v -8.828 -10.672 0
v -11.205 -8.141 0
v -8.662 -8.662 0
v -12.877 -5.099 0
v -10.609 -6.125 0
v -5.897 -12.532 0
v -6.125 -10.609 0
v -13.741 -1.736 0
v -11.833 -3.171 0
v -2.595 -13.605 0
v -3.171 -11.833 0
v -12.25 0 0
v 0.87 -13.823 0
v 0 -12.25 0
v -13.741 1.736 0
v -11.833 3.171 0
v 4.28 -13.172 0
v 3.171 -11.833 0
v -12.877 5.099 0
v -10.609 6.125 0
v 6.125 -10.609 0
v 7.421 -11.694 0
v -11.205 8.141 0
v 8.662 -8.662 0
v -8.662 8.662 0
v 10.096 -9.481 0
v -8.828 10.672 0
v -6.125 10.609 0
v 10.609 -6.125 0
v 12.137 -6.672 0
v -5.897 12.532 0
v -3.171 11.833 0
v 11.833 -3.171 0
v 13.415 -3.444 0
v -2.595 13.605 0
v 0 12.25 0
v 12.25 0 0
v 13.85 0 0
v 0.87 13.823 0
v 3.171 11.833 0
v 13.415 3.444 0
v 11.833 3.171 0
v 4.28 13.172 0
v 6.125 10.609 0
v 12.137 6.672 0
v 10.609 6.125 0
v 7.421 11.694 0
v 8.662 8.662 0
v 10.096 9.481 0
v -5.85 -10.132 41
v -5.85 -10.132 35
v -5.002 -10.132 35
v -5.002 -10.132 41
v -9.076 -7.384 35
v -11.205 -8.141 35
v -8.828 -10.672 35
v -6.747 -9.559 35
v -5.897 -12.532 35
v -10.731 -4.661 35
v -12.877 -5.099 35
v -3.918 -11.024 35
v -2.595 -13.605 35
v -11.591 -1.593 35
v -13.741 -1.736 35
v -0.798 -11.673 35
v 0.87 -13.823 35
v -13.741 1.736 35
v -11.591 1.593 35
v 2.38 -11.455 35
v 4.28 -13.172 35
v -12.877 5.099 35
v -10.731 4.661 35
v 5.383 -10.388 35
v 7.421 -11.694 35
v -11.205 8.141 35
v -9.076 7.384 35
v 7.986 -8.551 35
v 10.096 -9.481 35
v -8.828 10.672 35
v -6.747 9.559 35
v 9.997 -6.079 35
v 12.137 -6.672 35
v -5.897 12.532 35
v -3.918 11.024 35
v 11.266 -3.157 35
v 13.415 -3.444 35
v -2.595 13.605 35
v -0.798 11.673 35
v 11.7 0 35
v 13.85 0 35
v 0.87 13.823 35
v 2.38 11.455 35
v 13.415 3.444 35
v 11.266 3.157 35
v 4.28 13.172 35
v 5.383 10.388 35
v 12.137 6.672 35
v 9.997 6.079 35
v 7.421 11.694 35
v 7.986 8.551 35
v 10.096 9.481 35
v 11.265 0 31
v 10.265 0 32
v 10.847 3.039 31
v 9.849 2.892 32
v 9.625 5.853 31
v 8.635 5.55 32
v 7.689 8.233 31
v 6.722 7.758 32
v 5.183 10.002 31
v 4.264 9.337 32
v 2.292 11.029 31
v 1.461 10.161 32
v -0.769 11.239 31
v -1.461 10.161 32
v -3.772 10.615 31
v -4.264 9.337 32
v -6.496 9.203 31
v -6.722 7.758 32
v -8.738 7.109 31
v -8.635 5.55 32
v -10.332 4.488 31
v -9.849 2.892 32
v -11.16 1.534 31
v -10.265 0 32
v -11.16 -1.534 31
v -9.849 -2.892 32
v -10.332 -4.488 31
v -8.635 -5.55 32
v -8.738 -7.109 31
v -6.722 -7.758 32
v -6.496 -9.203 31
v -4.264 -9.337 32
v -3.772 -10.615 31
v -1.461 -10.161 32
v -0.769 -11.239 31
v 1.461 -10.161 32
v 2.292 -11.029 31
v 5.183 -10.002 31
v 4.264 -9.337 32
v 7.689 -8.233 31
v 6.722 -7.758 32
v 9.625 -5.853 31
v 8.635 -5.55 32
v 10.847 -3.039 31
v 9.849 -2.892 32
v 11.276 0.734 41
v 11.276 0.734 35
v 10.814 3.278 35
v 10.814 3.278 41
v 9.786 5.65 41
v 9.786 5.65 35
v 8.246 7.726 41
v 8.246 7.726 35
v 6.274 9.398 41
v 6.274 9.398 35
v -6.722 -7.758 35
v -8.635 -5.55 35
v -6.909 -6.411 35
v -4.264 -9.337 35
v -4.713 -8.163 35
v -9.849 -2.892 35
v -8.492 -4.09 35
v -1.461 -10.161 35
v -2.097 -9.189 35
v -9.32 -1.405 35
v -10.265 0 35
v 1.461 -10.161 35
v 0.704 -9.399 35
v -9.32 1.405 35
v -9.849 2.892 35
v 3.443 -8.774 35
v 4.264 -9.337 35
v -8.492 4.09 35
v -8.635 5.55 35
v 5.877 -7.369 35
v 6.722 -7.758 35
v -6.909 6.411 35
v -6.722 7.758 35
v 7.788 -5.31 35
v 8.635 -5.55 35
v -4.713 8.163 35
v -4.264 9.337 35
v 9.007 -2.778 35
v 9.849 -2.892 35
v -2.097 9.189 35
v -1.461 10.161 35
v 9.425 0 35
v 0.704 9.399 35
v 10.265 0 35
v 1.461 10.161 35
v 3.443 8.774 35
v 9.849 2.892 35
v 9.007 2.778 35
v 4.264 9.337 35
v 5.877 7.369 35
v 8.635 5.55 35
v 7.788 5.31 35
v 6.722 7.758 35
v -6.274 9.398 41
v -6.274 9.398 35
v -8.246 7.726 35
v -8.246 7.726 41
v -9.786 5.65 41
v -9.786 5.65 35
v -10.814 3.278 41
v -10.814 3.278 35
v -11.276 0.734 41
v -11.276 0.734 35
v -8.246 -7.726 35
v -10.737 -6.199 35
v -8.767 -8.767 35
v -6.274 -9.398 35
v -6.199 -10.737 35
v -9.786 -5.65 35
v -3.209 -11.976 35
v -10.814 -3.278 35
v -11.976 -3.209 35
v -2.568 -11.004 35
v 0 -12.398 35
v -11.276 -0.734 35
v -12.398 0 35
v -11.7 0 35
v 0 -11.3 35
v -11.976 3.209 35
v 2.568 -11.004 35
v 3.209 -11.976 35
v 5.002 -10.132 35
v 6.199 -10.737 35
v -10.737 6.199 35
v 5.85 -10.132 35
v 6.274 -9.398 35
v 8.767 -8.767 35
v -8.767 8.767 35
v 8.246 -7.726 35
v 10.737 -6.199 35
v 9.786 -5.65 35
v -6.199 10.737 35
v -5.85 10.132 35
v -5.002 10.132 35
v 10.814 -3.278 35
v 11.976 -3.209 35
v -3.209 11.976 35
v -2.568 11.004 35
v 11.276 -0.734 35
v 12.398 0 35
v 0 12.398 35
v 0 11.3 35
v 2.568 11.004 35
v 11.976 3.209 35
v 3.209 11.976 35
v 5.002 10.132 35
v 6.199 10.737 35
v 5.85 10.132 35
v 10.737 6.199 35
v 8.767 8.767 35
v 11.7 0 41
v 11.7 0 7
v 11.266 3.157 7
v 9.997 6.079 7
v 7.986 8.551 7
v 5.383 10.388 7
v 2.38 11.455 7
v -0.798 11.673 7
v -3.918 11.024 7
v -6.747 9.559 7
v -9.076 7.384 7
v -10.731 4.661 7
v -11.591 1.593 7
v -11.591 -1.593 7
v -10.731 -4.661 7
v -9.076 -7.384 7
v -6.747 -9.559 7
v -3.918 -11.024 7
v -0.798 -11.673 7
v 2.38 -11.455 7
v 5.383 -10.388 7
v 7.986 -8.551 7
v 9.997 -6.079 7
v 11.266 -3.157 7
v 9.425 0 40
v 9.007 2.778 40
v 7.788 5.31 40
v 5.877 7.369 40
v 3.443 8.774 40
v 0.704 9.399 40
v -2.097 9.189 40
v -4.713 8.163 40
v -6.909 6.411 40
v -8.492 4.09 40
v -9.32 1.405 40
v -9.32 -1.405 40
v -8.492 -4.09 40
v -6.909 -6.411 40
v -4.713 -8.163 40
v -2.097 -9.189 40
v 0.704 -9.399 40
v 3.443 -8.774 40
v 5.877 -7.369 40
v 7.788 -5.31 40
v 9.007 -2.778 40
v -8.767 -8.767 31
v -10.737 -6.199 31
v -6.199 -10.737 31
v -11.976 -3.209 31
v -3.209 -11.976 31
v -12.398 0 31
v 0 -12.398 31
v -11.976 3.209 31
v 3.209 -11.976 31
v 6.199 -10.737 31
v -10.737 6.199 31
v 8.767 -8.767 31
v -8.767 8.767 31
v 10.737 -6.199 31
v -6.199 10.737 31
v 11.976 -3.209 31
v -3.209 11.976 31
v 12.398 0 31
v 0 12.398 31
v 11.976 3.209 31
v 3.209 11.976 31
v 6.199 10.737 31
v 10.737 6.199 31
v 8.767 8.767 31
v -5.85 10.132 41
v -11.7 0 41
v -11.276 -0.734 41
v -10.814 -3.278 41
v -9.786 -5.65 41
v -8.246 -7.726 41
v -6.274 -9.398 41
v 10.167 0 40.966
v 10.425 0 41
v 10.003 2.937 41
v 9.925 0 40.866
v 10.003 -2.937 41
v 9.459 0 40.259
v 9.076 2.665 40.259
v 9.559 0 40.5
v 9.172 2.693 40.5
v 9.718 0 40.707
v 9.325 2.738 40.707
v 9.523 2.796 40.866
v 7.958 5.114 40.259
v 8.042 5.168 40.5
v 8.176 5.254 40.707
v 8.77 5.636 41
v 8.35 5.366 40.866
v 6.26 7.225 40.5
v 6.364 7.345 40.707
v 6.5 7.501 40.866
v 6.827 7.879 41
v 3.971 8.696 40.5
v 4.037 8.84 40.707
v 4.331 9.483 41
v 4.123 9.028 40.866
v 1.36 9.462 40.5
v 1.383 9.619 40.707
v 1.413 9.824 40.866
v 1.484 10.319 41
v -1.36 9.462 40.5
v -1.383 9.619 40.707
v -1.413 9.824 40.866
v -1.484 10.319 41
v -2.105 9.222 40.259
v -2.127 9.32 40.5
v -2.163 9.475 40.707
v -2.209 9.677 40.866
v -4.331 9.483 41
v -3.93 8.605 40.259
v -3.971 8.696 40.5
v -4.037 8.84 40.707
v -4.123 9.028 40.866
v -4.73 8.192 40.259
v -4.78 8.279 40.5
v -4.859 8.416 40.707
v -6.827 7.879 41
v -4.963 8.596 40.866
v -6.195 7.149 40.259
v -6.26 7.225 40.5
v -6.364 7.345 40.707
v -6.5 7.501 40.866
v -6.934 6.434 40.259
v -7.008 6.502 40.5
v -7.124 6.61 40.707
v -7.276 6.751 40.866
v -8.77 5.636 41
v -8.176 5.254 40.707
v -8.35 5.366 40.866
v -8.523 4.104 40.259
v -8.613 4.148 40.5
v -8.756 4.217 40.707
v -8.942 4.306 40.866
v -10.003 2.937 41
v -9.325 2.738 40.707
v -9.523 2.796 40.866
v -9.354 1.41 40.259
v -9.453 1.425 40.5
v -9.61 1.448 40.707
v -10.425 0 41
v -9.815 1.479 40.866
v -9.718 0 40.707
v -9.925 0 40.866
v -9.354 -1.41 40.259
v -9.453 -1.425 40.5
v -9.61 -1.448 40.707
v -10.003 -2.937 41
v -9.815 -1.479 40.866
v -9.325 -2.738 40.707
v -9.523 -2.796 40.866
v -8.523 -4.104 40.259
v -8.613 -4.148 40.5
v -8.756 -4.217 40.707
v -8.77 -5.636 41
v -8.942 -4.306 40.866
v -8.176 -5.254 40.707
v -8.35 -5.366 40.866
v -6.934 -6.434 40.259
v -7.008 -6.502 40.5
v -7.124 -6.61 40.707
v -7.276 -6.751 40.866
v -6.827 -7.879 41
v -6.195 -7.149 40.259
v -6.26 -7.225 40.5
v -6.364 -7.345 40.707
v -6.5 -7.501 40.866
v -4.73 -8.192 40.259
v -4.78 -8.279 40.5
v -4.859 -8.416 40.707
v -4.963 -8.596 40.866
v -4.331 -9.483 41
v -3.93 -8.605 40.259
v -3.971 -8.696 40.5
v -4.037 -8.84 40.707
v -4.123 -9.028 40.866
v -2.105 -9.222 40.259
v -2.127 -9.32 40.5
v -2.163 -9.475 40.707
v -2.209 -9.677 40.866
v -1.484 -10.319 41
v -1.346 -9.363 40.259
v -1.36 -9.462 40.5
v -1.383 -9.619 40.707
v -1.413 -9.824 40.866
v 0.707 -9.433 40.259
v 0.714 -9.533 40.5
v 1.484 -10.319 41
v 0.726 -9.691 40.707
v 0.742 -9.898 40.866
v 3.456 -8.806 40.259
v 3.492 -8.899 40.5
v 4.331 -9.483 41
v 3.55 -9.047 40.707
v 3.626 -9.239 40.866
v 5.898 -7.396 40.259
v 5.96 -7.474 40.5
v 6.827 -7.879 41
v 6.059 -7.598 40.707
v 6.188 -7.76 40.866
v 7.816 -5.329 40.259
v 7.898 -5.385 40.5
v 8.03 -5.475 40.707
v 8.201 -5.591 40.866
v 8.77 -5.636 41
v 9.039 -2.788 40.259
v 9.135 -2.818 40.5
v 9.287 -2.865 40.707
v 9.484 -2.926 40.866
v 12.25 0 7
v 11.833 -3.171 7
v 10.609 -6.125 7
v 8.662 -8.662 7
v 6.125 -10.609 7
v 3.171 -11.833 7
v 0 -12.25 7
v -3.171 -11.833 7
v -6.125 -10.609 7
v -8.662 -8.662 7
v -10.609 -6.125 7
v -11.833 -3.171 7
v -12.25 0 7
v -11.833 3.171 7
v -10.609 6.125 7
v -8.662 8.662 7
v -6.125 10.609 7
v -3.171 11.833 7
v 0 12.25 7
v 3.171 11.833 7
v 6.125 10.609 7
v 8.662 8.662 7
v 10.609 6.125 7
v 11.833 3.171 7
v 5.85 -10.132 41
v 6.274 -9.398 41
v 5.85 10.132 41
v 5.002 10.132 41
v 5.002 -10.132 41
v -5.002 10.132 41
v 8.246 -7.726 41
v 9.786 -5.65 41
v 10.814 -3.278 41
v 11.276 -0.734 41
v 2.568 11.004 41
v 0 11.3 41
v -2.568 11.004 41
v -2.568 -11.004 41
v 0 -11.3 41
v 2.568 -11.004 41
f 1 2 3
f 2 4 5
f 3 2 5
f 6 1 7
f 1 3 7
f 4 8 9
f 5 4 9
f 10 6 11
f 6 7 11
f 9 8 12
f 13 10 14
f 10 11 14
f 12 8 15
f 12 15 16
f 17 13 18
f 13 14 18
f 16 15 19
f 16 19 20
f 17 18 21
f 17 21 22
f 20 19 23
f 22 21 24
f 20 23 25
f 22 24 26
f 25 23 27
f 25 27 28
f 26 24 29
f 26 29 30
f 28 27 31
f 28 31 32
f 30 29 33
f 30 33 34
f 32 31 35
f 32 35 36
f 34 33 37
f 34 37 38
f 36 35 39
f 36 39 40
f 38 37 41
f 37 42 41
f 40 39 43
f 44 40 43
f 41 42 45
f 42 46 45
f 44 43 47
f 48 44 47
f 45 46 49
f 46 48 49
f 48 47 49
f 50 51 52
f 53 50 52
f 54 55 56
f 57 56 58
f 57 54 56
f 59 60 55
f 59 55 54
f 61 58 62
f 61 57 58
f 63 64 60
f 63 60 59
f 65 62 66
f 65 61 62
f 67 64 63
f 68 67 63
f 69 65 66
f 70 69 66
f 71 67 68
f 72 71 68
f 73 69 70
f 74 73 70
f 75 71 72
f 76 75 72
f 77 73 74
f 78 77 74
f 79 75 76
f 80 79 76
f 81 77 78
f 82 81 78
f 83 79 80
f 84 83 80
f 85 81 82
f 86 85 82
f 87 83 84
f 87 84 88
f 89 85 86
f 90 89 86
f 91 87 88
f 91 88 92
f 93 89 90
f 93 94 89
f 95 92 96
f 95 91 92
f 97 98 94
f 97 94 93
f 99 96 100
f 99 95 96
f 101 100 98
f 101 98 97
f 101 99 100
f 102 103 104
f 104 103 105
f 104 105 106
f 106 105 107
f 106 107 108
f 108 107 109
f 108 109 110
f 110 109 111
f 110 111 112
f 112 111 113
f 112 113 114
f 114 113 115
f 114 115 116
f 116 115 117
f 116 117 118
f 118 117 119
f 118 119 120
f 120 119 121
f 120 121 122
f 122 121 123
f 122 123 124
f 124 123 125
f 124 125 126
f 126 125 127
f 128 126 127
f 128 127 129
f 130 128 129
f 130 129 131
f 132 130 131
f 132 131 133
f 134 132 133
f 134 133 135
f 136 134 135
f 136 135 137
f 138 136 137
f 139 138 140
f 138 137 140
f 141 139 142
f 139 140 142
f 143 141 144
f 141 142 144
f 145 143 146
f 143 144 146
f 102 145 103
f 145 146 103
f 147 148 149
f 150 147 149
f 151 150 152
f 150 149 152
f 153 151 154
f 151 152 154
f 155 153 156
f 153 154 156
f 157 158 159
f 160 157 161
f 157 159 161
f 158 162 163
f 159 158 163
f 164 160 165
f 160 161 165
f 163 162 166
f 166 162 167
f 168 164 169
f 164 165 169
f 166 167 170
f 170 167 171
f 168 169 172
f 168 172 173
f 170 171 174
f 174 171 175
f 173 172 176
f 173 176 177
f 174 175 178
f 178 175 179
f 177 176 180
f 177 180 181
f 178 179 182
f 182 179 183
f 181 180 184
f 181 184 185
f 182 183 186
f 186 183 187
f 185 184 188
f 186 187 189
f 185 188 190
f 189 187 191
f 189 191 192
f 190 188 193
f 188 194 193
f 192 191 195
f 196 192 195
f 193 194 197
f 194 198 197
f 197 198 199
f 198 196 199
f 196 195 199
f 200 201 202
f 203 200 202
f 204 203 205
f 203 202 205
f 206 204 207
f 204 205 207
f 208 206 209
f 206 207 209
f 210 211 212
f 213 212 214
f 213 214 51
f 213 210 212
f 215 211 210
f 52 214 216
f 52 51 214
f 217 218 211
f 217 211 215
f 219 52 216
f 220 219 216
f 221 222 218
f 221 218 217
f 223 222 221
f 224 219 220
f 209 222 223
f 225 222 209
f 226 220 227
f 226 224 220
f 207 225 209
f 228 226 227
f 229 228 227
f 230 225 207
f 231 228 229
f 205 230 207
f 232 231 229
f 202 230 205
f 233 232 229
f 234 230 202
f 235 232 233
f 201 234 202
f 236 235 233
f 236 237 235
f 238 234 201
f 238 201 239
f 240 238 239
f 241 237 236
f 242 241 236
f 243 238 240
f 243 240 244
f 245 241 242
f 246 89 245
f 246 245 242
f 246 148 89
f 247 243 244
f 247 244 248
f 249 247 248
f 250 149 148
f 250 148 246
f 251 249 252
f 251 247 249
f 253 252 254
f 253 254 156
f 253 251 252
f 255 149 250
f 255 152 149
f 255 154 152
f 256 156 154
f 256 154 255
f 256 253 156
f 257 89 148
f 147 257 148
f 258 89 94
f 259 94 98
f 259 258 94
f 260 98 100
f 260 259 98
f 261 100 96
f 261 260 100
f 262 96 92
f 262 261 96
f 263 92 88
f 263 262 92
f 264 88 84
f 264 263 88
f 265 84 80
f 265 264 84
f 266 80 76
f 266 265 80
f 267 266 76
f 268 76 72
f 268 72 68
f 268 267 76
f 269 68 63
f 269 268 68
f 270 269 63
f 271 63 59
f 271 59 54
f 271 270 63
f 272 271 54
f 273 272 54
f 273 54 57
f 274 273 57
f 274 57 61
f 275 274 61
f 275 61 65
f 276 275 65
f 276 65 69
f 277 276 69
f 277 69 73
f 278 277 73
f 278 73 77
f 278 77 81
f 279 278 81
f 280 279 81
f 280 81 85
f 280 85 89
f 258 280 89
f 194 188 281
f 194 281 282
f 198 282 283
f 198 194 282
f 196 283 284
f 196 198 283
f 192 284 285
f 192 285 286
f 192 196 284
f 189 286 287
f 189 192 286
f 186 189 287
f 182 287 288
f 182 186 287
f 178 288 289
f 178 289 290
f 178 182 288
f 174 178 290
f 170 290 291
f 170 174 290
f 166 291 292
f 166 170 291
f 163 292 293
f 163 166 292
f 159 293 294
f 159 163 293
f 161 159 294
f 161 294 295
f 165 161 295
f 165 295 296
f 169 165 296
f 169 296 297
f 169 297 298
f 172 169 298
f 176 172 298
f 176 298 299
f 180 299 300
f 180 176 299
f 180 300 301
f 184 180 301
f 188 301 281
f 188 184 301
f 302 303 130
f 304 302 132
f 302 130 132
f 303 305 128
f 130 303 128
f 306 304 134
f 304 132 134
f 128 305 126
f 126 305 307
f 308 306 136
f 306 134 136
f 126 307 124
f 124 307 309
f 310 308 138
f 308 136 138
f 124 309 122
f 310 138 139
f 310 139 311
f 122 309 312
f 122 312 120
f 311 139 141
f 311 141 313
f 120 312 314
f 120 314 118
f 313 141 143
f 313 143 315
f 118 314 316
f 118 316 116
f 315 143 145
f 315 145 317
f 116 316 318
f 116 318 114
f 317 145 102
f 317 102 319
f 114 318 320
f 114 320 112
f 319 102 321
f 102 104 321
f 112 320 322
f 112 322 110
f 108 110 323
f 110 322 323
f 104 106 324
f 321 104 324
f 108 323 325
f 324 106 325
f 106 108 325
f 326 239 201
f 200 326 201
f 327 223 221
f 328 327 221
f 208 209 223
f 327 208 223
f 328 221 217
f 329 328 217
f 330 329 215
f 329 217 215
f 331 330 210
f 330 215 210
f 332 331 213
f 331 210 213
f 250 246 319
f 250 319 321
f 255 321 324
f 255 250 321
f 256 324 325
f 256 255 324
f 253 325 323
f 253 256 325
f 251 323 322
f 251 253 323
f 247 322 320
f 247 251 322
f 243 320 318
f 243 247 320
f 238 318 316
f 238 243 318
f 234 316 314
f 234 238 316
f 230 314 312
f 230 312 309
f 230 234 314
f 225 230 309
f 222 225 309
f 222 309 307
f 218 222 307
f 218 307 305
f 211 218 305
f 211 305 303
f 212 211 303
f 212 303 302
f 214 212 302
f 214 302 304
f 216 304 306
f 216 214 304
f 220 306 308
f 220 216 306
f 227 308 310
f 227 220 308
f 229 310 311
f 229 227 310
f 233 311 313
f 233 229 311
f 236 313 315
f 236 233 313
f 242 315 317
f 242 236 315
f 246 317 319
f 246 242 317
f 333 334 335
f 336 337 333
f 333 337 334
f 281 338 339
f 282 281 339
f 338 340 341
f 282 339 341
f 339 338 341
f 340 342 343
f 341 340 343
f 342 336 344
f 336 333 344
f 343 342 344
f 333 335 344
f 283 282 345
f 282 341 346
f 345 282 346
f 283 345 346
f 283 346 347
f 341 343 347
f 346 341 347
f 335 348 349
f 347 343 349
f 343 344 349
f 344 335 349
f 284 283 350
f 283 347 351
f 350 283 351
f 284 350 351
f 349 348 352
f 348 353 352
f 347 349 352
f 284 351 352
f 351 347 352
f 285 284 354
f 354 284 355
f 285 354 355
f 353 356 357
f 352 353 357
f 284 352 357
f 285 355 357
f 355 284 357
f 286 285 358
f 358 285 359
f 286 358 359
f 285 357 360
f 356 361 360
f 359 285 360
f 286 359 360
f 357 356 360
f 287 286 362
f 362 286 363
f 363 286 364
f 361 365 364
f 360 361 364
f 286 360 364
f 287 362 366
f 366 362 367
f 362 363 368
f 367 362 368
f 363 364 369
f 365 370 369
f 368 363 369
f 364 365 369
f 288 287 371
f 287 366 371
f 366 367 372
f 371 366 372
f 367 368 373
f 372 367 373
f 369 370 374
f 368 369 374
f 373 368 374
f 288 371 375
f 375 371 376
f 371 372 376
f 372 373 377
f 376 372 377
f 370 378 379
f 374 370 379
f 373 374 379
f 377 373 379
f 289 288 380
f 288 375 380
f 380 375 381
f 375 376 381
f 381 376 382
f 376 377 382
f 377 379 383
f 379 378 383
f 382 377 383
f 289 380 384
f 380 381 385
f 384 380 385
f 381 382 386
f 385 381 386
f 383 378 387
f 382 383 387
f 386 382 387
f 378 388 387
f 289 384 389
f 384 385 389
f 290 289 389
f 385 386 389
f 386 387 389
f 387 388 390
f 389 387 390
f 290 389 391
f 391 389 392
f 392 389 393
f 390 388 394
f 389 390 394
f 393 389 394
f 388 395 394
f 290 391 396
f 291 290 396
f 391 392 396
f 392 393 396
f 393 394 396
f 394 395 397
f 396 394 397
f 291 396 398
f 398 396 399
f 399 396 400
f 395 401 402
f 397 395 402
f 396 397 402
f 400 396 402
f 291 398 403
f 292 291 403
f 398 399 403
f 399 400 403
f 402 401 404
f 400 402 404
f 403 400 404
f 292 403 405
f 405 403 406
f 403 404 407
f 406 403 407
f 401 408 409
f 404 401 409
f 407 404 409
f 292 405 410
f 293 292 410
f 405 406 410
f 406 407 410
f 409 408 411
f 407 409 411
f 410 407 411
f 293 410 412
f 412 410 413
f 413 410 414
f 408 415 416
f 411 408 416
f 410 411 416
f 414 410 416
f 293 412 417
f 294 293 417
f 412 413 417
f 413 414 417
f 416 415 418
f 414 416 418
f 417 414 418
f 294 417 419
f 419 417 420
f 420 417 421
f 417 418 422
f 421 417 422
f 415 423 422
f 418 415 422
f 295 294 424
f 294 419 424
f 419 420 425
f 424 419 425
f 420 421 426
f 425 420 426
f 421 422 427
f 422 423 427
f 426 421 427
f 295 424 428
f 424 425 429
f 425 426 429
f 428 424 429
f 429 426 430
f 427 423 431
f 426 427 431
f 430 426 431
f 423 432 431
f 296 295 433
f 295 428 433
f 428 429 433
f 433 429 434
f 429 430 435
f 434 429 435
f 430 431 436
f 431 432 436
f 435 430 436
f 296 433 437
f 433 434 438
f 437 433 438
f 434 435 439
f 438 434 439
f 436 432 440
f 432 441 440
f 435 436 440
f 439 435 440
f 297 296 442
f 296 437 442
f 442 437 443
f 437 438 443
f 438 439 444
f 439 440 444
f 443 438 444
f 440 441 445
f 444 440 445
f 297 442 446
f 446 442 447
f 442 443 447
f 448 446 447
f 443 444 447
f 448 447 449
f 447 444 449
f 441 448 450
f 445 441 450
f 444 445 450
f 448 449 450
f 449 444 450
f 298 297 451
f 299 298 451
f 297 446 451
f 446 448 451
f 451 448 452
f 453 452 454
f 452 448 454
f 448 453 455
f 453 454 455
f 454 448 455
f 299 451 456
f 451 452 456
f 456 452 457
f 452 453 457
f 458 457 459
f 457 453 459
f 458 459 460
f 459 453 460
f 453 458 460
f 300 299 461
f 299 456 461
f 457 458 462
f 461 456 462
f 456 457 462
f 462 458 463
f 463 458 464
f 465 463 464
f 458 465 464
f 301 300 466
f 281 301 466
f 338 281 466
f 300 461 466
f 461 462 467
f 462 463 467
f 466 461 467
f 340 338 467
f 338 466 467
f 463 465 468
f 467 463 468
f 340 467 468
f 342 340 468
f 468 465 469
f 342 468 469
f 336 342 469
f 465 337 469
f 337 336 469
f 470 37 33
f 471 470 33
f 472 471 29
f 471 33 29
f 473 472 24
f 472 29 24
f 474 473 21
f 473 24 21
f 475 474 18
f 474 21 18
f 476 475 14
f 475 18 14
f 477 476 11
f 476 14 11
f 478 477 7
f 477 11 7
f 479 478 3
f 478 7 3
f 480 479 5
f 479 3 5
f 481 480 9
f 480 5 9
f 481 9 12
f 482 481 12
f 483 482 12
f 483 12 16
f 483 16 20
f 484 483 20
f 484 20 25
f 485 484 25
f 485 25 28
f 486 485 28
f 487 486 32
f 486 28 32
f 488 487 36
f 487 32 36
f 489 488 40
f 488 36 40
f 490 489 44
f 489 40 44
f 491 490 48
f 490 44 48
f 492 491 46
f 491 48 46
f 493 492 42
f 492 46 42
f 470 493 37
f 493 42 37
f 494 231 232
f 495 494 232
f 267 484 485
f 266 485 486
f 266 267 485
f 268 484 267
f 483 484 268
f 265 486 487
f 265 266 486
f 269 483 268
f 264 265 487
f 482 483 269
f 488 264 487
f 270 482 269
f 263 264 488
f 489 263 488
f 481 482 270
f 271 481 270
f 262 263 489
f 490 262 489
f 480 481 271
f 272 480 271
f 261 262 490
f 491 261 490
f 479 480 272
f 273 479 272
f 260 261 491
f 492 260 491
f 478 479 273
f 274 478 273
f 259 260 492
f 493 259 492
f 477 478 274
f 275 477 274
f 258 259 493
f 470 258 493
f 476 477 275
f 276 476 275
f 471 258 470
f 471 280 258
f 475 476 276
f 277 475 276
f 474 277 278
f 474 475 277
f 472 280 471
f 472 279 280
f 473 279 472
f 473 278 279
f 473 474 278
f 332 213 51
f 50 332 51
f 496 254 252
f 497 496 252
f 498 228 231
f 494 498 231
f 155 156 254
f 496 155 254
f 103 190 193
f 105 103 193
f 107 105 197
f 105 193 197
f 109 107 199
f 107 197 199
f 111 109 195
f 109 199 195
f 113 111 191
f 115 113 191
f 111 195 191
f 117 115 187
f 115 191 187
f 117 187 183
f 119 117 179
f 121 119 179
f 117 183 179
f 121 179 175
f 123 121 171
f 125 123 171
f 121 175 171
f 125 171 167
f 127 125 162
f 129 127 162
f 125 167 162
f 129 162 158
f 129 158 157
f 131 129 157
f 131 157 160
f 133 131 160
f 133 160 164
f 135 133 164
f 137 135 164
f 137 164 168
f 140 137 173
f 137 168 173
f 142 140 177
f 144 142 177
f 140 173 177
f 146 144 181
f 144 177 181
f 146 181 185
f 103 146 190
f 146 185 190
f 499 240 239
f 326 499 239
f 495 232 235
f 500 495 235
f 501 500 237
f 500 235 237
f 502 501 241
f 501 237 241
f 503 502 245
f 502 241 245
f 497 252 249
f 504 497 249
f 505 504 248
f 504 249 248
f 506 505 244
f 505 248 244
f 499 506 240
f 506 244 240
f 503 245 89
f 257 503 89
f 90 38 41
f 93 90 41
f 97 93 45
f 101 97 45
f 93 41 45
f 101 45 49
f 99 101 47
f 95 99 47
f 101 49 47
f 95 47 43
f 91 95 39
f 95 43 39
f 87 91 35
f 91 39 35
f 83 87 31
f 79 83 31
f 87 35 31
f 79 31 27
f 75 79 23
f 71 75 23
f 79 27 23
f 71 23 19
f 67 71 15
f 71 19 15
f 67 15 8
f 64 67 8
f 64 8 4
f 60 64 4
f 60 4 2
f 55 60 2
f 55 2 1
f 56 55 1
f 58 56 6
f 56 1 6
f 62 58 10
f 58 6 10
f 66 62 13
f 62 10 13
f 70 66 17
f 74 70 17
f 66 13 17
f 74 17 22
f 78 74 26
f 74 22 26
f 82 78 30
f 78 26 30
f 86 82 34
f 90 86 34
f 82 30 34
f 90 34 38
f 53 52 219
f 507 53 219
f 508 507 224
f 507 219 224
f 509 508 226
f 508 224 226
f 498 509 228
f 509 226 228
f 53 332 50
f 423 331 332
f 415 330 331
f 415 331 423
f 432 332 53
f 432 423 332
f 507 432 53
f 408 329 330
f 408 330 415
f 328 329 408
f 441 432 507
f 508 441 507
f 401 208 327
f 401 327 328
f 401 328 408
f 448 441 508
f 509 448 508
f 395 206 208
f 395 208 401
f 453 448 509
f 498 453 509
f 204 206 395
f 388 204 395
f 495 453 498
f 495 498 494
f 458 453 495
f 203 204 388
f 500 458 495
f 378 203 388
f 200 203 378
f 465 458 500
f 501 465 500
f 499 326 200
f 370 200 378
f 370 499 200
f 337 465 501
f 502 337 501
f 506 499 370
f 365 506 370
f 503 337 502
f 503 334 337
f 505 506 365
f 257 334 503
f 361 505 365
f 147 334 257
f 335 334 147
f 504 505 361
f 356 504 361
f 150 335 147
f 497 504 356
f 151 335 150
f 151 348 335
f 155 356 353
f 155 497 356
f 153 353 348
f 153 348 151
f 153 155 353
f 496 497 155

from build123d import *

# Parameters (mm, degrees)
F0_R     = 13.85
F0_R_2   = 11.7
F1_DEPTH = 35
F2_R     = 9.4254173389
F3_DEPTH = 6
F4_R     = 12.3979909048
F4_R_2   = 10.2650176462
F5_DEPTH = 4
F6_SIZE  = 1
F7_R     = 1
F8_R     = 12.25
F9_DEPTH = 7


with BuildPart() as f1:
    # F0 (on Top) → F1 (new body)
    with BuildSketch(Plane.XY):
        Circle(F0_R)
        Circle(F0_R_2, mode=Mode.SUBTRACT)
    extrude(amount=F1_DEPTH)

    # F8 (on face) → F9 (cut)
    with BuildSketch(Plane(origin=(0, 0, 0), x_dir=(1, 0, 0), z_dir=(0, 0, -1))):
        Circle(F8_R)
    extrude(amount=-F9_DEPTH, mode=Mode.SUBTRACT)


with BuildPart() as f3:
    # F2 (on face) → F3 (new body)
    with BuildSketch(Plane.XY.offset(35)):
        with BuildLine():
            ThreePointArc((11.276124747, -0.7341734743), (11.2940296095, -0.3672807911), (11.3, 0))
            ThreePointArc((11.3, 0), (11.2940296095, 0.3672807911), (11.276124747, 0.7341734743))
            Line((11.276124747, 0.7341734743), (6.273875253, 9.39832375))
            ThreePointArc((6.273875253, 9.39832375), (5.65, 9.7860870628), (5.002249494, 10.1324972243))
            Line((5.002249494, 10.1324972243), (-5.002249494, 10.1324972243))
            ThreePointArc((-5.002249494, 10.1324972243), (-5.65, 9.7860870628), (-6.273875253, 9.39832375))
            Line((-6.273875253, 9.39832375), (-11.276124747, 0.7341734743))
            ThreePointArc((-11.276124747, 0.7341734743), (-11.3, 0), (-11.276124747, -0.7341734743))
            Line((-11.276124747, -0.7341734743), (-6.273875253, -9.39832375))
            ThreePointArc((-6.273875253, -9.39832375), (-5.65, -9.7860870628), (-5.002249494, -10.1324972243))
            Line((-5.002249494, -10.1324972243), (5.002249494, -10.1324972243))
            ThreePointArc((5.002249494, -10.1324972243), (5.65, -9.7860870628), (6.273875253, -9.39832375))
            Line((6.273875253, -9.39832375), (11.276124747, -0.7341734743))
        make_face()
        Circle(F2_R, mode=Mode.SUBTRACT)
        with BuildLine():
            ThreePointArc((11.276124747, 0.7341734743), (11.2940296095, 0.3672807911), (11.3, 0))
            ThreePointArc((11.3, 0), (11.2940296095, -0.3672807911), (11.276124747, -0.7341734743))
            Line((11.276124747, -0.7341734743), (11.7, 0))
            Line((11.7, 0), (11.276124747, 0.7341734743))
        make_face()
        with BuildLine():
            Line((6.273875253, 9.39832375), (11.276124747, 0.7341734743))
            ThreePointArc((11.276124747, 0.7341734743), (9.7860870628, 5.65), (6.273875253, 9.39832375))
        make_face()
        with BuildLine():
            ThreePointArc((6.273875253, -9.39832375), (9.7860870628, -5.65), (11.276124747, -0.7341734743))
            Line((11.276124747, -0.7341734743), (6.273875253, -9.39832375))
        make_face()
        with BuildLine():
            ThreePointArc((5.002249494, 10.1324972243), (5.65, 9.7860870628), (6.273875253, 9.39832375))
            Line((6.273875253, 9.39832375), (5.85, 10.1324972243))
            Line((5.85, 10.1324972243), (5.002249494, 10.1324972243))
        make_face()
        with BuildLine():
            Line((5.85, -10.1324972243), (6.273875253, -9.39832375))
            ThreePointArc((6.273875253, -9.39832375), (5.65, -9.7860870628), (5.002249494, -10.1324972243))
            Line((5.002249494, -10.1324972243), (5.85, -10.1324972243))
        make_face()
        with BuildLine():
            Line((-5.002249494, 10.1324972243), (5.002249494, 10.1324972243))
            ThreePointArc((5.002249494, 10.1324972243), (0, 11.3), (-5.002249494, 10.1324972243))
        make_face()
        with BuildLine():
            ThreePointArc((-5.002249494, -10.1324972243), (0, -11.3), (5.002249494, -10.1324972243))
            Line((5.002249494, -10.1324972243), (-5.002249494, -10.1324972243))
        make_face()
        with BuildLine():
            ThreePointArc((-6.273875253, 9.39832375), (-5.65, 9.7860870628), (-5.002249494, 10.1324972243))
            Line((-5.002249494, 10.1324972243), (-5.85, 10.1324972243))
            Line((-5.85, 10.1324972243), (-6.273875253, 9.39832375))
        make_face()
        with BuildLine():
            Line((-5.85, -10.1324972243), (-5.002249494, -10.1324972243))
            ThreePointArc((-5.002249494, -10.1324972243), (-5.65, -9.7860870628), (-6.273875253, -9.39832375))
            Line((-6.273875253, -9.39832375), (-5.85, -10.1324972243))
        make_face()
        with BuildLine():
            Line((-11.276124747, 0.7341734743), (-6.273875253, 9.39832375))
            ThreePointArc((-6.273875253, 9.39832375), (-9.7860870628, 5.65), (-11.276124747, 0.7341734743))
        make_face()
        with BuildLine():
            ThreePointArc((-11.276124747, -0.7341734743), (-9.7860870628, -5.65), (-6.273875253, -9.39832375))
            Line((-6.273875253, -9.39832375), (-11.276124747, -0.7341734743))
        make_face()
        with BuildLine():
            ThreePointArc((-11.276124747, -0.7341734743), (-11.3, 0), (-11.276124747, 0.7341734743))
            Line((-11.276124747, 0.7341734743), (-11.7, 0))
            Line((-11.7, 0), (-11.276124747, -0.7341734743))
        make_face()
    extrude(amount=F3_DEPTH)

    # F4 (on face) → F5 (join)
    with BuildSketch(Plane.XY.offset(35)):
        Circle(F4_R)
        Circle(F4_R_2, mode=Mode.SUBTRACT)
    extrude(amount=-F5_DEPTH)

    # F6
    f6_edges = [f3.edges().sort_by_distance(p)[0] for p in [
        (-10.265018, 0, 31),
    ]]
    chamfer(f6_edges, length=F6_SIZE)

    # F7
    f7_edges = [f3.edges().sort_by_distance(p)[0] for p in [
        (-9.425417, 0, 41),
    ]]
    fillet(f7_edges, radius=F7_R)


solid = Compound([f1.part, f3.part])
